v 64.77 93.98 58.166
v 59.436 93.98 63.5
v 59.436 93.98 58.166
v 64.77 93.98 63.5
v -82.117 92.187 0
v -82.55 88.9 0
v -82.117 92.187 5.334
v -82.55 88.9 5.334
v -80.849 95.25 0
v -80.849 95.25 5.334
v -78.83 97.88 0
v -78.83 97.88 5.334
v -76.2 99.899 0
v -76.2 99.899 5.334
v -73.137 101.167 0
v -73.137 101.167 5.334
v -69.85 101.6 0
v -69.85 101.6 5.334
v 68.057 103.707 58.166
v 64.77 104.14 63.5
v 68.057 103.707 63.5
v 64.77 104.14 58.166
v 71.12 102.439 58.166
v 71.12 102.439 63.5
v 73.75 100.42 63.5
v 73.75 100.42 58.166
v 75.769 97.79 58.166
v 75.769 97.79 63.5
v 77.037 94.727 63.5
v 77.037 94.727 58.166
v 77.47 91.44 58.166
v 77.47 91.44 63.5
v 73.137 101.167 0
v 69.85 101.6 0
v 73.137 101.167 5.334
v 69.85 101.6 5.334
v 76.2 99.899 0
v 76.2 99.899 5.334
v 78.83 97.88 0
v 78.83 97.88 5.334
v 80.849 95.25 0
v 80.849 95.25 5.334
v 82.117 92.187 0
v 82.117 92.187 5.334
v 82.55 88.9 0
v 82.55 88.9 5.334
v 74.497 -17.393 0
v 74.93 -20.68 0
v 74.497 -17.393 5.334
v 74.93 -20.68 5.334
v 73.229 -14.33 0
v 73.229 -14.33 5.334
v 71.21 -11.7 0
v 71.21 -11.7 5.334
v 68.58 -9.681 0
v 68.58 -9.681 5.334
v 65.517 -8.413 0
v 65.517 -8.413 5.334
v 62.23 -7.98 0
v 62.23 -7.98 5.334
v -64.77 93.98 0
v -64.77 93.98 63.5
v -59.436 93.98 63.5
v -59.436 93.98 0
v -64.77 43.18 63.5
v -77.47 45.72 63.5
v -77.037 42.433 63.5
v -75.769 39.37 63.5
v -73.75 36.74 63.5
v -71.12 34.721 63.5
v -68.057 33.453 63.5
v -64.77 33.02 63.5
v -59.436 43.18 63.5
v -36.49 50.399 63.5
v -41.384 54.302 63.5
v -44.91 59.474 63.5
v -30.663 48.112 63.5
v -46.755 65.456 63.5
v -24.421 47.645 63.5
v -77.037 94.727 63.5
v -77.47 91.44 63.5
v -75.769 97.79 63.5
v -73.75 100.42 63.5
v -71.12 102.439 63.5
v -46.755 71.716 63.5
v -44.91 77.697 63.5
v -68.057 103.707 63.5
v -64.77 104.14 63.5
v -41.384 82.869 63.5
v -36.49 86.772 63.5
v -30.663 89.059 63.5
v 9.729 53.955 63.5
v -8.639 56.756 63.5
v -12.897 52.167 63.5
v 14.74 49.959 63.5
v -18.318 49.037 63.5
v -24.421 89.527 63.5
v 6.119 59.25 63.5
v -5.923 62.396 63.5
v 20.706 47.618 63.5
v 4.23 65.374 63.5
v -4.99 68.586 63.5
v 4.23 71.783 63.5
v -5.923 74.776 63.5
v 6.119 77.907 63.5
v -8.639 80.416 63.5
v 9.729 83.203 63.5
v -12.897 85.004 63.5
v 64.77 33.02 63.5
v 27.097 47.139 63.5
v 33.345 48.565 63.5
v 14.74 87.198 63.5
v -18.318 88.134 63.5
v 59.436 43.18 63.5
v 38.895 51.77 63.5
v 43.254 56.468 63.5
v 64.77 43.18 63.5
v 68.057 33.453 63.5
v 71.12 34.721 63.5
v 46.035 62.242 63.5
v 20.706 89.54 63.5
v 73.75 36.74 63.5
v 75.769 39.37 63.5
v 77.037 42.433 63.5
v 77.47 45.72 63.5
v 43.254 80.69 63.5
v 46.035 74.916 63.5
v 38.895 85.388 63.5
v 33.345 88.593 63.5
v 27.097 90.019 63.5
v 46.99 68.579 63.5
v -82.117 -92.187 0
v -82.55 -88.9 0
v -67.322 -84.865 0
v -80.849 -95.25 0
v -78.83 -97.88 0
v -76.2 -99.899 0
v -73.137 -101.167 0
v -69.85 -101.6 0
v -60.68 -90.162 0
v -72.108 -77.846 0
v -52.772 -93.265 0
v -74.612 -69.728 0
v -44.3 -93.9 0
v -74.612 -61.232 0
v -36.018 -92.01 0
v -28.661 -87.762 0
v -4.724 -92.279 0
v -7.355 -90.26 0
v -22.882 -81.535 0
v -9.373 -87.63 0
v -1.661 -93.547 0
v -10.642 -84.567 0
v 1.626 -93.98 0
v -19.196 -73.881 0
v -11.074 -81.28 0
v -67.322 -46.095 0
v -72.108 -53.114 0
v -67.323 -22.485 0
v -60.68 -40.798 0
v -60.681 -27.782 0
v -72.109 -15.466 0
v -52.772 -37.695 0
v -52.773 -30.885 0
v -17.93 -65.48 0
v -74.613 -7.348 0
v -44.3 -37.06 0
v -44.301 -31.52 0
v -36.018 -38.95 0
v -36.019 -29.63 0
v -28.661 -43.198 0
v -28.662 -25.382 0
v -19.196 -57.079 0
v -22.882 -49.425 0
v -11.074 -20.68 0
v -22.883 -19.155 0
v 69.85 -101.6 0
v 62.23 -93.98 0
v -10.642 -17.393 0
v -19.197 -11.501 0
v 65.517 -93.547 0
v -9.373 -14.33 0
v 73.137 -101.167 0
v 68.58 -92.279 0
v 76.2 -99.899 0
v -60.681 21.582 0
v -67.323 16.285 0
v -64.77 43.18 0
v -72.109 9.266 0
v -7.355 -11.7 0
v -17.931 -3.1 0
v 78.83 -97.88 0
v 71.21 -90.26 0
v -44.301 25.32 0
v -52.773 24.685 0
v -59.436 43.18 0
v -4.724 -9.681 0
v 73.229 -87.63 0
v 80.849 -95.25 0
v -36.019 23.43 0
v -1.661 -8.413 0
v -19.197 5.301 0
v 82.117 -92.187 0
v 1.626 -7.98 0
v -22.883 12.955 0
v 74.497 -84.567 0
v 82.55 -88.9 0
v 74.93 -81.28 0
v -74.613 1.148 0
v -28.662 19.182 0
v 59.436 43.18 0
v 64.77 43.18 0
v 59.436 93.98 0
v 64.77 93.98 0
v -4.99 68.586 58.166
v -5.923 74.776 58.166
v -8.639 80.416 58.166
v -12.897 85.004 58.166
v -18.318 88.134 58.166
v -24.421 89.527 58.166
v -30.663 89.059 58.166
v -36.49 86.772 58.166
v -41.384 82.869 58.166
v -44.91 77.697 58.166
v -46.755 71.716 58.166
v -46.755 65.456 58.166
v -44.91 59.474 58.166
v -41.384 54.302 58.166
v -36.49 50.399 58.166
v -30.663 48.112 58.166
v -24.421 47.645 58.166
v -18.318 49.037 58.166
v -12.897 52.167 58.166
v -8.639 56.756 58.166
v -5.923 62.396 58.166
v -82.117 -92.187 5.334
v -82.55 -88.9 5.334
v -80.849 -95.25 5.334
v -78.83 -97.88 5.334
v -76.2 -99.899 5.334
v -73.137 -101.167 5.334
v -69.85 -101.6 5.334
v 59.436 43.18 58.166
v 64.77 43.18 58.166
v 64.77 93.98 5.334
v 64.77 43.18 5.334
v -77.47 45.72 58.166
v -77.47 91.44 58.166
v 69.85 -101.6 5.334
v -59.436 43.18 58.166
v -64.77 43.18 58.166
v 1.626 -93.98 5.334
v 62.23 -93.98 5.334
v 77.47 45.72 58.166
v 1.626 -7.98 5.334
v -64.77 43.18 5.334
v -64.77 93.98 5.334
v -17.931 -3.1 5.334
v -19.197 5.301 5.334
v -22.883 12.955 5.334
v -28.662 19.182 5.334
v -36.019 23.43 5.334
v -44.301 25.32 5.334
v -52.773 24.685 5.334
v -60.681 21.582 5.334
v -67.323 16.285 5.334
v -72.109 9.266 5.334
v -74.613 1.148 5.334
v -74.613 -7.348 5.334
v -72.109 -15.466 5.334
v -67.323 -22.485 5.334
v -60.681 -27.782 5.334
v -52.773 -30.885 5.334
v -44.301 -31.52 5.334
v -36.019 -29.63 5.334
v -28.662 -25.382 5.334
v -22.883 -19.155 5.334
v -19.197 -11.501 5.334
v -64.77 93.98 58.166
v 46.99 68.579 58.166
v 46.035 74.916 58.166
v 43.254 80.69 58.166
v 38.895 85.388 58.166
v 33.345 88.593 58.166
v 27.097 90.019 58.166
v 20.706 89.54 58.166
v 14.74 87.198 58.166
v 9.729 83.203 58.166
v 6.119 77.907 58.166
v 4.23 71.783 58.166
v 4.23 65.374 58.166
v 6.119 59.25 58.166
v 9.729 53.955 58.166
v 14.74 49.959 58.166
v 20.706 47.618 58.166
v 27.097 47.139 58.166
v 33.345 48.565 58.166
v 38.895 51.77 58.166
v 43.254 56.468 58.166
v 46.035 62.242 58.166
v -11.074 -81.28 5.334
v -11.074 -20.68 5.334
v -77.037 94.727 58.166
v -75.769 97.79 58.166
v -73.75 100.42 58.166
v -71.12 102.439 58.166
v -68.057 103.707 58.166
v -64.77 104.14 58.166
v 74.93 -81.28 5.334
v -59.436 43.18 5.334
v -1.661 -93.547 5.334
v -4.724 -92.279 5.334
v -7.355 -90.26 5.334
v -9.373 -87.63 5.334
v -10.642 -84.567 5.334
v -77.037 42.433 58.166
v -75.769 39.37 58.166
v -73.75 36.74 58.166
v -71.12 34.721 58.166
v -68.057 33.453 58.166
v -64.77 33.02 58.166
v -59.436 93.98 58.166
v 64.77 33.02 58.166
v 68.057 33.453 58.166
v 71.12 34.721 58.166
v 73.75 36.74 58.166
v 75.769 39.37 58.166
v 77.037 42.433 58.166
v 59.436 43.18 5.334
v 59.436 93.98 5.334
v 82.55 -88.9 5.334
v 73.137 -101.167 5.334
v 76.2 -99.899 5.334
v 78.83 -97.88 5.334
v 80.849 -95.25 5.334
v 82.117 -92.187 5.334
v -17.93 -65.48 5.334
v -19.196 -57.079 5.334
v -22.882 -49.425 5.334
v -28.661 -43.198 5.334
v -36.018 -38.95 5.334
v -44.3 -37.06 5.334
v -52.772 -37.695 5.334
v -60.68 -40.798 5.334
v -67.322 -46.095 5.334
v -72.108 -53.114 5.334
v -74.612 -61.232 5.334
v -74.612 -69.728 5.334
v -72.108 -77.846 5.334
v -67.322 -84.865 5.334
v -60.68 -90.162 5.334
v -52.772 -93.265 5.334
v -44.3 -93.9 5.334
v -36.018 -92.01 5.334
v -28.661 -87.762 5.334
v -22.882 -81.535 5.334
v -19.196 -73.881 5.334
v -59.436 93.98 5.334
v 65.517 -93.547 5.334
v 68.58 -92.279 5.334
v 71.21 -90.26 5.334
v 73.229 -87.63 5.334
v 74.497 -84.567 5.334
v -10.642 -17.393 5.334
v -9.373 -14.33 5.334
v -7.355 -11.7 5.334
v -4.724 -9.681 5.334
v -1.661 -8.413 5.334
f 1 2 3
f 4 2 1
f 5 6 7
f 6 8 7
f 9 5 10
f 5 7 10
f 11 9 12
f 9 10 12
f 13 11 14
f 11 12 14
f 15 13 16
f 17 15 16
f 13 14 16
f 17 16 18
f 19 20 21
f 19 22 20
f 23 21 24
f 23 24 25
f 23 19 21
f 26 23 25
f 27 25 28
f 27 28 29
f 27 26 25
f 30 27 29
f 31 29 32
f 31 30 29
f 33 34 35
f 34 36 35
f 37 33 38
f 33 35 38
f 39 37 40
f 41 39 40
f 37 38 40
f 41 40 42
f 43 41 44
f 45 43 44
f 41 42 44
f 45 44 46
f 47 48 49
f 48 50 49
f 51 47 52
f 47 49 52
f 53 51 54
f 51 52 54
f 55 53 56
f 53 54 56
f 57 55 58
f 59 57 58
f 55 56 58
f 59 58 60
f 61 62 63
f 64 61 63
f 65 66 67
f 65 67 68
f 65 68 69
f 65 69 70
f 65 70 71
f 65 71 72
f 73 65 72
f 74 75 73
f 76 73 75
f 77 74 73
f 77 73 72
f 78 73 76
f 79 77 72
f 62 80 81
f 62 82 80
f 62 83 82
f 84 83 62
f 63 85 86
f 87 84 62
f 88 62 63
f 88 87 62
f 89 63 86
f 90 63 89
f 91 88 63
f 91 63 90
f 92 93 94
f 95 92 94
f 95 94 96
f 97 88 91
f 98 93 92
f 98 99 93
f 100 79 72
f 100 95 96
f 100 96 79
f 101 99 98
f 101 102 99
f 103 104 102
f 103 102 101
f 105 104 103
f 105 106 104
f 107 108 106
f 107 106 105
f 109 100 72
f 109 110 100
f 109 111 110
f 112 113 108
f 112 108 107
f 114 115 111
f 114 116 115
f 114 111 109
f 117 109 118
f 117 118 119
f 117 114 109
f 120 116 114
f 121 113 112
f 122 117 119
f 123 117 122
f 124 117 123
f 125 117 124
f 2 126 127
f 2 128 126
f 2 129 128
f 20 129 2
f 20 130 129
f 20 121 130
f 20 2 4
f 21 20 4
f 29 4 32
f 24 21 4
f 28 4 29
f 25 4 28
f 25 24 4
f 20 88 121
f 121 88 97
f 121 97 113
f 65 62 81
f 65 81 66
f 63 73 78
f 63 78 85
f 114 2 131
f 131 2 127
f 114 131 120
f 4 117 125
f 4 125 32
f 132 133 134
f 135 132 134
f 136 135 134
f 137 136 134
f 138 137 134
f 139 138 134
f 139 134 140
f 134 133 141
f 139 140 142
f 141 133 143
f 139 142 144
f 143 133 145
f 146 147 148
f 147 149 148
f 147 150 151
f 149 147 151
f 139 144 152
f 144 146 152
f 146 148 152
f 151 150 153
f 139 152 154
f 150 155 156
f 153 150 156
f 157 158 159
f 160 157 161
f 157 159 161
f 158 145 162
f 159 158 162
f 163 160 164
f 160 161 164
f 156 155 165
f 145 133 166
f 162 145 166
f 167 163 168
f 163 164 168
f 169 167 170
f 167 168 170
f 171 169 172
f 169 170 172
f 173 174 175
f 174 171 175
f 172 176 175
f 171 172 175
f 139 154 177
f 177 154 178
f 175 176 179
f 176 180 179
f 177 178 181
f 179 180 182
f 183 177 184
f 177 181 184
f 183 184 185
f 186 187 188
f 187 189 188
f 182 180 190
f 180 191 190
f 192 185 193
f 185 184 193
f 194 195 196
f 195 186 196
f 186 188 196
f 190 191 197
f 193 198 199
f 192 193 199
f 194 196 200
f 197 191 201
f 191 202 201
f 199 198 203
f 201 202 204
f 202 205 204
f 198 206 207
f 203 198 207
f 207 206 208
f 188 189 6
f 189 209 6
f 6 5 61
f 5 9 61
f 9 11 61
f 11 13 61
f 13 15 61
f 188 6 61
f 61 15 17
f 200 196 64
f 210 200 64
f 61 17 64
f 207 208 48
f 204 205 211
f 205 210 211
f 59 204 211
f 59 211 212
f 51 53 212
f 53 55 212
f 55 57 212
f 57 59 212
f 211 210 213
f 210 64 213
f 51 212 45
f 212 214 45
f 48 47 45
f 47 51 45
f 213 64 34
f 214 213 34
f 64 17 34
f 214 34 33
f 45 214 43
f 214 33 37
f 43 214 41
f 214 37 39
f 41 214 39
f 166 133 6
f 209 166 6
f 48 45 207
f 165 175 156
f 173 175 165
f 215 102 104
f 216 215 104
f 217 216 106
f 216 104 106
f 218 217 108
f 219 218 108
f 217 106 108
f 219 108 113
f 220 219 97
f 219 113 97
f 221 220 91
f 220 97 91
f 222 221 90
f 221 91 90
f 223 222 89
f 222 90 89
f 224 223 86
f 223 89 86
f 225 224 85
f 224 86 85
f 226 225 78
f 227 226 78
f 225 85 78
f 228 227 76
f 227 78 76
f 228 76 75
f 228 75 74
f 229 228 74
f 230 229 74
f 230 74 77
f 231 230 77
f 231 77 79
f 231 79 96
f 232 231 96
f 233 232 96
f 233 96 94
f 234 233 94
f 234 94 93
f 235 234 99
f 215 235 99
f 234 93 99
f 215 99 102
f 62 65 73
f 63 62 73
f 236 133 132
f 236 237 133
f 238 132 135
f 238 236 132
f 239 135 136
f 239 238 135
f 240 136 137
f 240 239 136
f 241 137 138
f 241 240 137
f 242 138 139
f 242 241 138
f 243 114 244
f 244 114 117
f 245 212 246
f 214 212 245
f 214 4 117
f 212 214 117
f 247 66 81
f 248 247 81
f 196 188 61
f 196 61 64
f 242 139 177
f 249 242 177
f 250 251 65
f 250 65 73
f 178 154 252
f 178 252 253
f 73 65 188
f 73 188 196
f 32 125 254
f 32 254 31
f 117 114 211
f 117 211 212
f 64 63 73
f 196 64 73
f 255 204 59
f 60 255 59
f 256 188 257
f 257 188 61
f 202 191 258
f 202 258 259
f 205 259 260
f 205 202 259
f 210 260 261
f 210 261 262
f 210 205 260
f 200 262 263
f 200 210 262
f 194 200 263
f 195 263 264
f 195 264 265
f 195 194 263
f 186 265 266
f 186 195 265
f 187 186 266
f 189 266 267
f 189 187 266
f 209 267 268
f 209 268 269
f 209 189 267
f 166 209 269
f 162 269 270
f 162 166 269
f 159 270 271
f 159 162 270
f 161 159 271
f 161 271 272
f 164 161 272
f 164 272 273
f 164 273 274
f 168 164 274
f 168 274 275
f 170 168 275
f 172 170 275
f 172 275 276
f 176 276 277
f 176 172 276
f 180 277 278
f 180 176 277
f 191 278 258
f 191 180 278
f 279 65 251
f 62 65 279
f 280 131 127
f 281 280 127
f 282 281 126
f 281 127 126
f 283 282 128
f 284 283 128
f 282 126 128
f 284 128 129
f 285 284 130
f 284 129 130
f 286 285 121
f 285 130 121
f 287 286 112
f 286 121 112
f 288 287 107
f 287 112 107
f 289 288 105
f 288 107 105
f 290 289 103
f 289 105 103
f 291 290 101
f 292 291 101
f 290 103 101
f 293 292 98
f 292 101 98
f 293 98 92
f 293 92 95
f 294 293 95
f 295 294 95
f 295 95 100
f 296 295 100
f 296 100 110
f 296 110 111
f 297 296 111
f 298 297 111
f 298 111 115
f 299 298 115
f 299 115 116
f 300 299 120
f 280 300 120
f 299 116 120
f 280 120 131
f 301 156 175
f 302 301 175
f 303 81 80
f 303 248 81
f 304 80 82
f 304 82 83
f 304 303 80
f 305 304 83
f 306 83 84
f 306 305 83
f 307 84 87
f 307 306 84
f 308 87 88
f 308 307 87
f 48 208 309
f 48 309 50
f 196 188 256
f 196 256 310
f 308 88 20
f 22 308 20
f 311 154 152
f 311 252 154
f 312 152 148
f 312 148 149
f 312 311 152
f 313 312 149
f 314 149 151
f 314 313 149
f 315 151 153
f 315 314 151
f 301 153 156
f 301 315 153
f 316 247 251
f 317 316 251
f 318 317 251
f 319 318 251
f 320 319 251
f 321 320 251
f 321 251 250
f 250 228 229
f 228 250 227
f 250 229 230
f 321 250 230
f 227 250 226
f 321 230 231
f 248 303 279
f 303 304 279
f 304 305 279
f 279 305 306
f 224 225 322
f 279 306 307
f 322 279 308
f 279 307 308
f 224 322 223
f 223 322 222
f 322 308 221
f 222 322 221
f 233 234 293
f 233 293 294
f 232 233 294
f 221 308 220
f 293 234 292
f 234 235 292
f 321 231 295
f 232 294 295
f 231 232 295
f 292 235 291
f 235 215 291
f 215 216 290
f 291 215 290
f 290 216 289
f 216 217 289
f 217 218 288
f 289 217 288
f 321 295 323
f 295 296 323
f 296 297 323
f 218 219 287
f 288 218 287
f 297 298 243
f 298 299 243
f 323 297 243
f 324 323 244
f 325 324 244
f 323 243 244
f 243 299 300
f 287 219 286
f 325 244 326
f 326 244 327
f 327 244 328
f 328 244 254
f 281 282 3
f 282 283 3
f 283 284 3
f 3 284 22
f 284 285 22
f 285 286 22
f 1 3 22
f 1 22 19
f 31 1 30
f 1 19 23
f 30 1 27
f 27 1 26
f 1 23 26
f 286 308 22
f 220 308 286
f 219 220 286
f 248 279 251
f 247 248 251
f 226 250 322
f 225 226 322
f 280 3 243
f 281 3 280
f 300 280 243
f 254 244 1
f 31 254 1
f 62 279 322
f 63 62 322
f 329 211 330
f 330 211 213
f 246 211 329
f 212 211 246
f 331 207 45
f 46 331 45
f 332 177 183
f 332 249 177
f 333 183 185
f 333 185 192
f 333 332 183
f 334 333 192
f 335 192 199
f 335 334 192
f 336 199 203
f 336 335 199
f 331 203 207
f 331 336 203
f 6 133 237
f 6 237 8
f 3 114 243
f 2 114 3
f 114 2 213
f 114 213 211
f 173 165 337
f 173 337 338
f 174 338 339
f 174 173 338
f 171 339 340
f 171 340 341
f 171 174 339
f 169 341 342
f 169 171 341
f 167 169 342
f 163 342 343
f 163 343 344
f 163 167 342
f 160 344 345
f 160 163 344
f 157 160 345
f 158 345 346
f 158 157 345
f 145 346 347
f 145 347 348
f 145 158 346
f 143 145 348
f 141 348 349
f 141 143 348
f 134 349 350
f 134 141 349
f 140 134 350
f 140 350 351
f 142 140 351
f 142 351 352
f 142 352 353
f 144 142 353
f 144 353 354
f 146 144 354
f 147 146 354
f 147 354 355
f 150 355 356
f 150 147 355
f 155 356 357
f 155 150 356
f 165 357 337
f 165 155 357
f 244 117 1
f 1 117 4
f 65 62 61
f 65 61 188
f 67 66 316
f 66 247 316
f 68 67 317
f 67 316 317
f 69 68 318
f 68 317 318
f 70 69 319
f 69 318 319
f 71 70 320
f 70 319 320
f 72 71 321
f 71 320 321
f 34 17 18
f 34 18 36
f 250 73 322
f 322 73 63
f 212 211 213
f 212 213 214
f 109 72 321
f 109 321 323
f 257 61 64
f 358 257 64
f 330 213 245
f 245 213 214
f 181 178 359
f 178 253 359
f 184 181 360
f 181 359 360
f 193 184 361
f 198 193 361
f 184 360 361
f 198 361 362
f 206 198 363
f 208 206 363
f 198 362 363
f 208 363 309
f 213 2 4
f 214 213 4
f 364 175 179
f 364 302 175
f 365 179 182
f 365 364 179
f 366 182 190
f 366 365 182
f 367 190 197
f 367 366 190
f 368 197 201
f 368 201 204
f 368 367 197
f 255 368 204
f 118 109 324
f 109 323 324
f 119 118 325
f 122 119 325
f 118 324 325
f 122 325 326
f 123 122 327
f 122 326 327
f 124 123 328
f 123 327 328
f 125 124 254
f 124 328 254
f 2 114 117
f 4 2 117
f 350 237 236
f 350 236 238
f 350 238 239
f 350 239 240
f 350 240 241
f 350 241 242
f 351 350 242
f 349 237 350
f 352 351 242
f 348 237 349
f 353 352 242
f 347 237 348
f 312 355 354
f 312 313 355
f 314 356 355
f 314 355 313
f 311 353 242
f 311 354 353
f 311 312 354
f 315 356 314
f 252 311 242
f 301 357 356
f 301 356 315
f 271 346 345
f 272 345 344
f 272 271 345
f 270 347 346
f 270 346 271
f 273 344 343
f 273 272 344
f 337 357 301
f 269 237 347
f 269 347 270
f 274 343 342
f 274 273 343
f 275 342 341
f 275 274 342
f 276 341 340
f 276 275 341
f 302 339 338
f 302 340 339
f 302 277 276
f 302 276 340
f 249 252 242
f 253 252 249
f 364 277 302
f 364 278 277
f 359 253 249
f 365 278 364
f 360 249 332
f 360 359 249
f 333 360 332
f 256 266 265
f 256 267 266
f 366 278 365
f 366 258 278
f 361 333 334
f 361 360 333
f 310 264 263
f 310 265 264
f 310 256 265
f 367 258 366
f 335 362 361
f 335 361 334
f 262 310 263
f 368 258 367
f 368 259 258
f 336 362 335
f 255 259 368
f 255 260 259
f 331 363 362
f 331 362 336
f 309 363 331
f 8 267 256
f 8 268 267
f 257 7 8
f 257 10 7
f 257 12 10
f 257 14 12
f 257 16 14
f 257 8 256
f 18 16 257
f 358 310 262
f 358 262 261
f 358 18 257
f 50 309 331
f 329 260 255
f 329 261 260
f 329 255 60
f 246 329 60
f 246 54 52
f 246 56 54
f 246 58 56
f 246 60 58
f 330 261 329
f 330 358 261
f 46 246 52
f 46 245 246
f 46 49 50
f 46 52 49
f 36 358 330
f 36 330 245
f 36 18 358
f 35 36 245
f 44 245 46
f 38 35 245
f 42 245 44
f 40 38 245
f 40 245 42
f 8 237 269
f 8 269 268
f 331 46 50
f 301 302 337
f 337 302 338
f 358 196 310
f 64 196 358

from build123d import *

# Parameters (mm, degrees)
F1_W     = 165.1
F1_H     = 203.2
F1_R     = 28.5
F1_W_2   = 86.0044
F1_H_2   = 86
F1_W_3   = 5.334
F1_H_3   = 50.8
F2_DEPTH = 5.334
F3_W     = 5.334
F3_H     = 50.8
F4_DEPTH = 63.5
F5_W     = 154.94
F5_H     = 71.12
F5_W_2   = 5.334
F5_H_2   = 50.8
F5_R     = 21.5
F5_R_2   = 21
F6_DEPTH = 5.334
F7_R     = 12.7
F7_2_R   = 12.7


# Not quite as in the source:
# - a variable given as a bare number and used for a length is read in inches; the dataset says mm whatever the document's units were


with BuildPart() as f2:
    # F1 (on Top) → F2 (new body)
    with BuildSketch(Plane.XY):
        Rectangle(F1_W, F1_H)
        with Locations((-46.43, -65.48)):
            Circle(F1_R, mode=Mode.SUBTRACT)
        with Locations((-46.4312, -3.1)):
            Circle(F1_R, mode=Mode.SUBTRACT)
        with Locations((31.9278, -50.98)):
            Rectangle(F1_W_2, F1_H_2, mode=Mode.SUBTRACT)
        with Locations((-62.103, 68.58)):
            Rectangle(F1_W_3, F1_H_3, mode=Mode.SUBTRACT)
        with Locations((62.103, 68.58)):
            Rectangle(F1_W_3, F1_H_3, mode=Mode.SUBTRACT)
    extrude(amount=F2_DEPTH)

    # F7
    f7_edges = [f2.edges().sort_by_distance(p)[0] for p in [
        (-82.55, -101.6, 2.667),
        (82.55, -101.6, 2.667),
        (-82.55, 101.6, 2.667),
        (82.55, 101.6, 2.667),
        (-11.0744, -7.98, 2.667),
        (74.93, -7.98, 2.667),
        (74.93, -93.98, 2.667),
        (-11.0744, -93.98, 2.667),
    ]]
    fillet(f7_edges, radius=F7_R)


with BuildPart() as f4:
    # F3 (on face) → F4 (new body)
    with BuildSketch(Plane(origin=(0, 0, 0), x_dir=(1, 0, 0), z_dir=(0, 0, -1))):
        with Locations((-62.103, -68.58)):
            Rectangle(F3_W, F3_H)
    extrude(amount=-F4_DEPTH)


with BuildPart() as f4b:
    # F3 (on face) → F4, piece 2 (new body)
    with BuildSketch(Plane(origin=(0, 0, 0), x_dir=(1, 0, 0), z_dir=(0, 0, -1))):
        with Locations((62.103, -68.58)):
            Rectangle(F3_W, F3_H)
    extrude(amount=-F4_DEPTH)


with BuildPart() as f6:
    # F5 (on face) → F6 (new body)
    with BuildSketch(Plane.XY.offset(63.5)):
        with Locations((0, 68.58)):
            Rectangle(F5_W, F5_H)
        with Locations((-62.103, 68.58)):
            Rectangle(F5_W_2, F5_H_2, mode=Mode.SUBTRACT)
        with Locations((25.49, 68.5789)):
            Circle(F5_R, mode=Mode.SUBTRACT)
        with Locations((62.103, 68.58)):
            Rectangle(F5_W_2, F5_H_2, mode=Mode.SUBTRACT)
        with Locations((-25.99, 68.5858)):
            Circle(F5_R_2, mode=Mode.SUBTRACT)
    extrude(amount=-F6_DEPTH)

    # F7#2
    f7_2_edges = [f6.edges().sort_by_distance(p)[0] for p in [
        (-77.47, 33.02, 60.833),
        (-77.47, 104.14, 60.833),
        (77.47, 33.02, 60.833),
        (77.47, 104.14, 60.833),
    ]]
    fillet(f7_2_edges, radius=F7_2_R)


solid = Compound([f2.part, f4.part, f4b.part, f6.part])
